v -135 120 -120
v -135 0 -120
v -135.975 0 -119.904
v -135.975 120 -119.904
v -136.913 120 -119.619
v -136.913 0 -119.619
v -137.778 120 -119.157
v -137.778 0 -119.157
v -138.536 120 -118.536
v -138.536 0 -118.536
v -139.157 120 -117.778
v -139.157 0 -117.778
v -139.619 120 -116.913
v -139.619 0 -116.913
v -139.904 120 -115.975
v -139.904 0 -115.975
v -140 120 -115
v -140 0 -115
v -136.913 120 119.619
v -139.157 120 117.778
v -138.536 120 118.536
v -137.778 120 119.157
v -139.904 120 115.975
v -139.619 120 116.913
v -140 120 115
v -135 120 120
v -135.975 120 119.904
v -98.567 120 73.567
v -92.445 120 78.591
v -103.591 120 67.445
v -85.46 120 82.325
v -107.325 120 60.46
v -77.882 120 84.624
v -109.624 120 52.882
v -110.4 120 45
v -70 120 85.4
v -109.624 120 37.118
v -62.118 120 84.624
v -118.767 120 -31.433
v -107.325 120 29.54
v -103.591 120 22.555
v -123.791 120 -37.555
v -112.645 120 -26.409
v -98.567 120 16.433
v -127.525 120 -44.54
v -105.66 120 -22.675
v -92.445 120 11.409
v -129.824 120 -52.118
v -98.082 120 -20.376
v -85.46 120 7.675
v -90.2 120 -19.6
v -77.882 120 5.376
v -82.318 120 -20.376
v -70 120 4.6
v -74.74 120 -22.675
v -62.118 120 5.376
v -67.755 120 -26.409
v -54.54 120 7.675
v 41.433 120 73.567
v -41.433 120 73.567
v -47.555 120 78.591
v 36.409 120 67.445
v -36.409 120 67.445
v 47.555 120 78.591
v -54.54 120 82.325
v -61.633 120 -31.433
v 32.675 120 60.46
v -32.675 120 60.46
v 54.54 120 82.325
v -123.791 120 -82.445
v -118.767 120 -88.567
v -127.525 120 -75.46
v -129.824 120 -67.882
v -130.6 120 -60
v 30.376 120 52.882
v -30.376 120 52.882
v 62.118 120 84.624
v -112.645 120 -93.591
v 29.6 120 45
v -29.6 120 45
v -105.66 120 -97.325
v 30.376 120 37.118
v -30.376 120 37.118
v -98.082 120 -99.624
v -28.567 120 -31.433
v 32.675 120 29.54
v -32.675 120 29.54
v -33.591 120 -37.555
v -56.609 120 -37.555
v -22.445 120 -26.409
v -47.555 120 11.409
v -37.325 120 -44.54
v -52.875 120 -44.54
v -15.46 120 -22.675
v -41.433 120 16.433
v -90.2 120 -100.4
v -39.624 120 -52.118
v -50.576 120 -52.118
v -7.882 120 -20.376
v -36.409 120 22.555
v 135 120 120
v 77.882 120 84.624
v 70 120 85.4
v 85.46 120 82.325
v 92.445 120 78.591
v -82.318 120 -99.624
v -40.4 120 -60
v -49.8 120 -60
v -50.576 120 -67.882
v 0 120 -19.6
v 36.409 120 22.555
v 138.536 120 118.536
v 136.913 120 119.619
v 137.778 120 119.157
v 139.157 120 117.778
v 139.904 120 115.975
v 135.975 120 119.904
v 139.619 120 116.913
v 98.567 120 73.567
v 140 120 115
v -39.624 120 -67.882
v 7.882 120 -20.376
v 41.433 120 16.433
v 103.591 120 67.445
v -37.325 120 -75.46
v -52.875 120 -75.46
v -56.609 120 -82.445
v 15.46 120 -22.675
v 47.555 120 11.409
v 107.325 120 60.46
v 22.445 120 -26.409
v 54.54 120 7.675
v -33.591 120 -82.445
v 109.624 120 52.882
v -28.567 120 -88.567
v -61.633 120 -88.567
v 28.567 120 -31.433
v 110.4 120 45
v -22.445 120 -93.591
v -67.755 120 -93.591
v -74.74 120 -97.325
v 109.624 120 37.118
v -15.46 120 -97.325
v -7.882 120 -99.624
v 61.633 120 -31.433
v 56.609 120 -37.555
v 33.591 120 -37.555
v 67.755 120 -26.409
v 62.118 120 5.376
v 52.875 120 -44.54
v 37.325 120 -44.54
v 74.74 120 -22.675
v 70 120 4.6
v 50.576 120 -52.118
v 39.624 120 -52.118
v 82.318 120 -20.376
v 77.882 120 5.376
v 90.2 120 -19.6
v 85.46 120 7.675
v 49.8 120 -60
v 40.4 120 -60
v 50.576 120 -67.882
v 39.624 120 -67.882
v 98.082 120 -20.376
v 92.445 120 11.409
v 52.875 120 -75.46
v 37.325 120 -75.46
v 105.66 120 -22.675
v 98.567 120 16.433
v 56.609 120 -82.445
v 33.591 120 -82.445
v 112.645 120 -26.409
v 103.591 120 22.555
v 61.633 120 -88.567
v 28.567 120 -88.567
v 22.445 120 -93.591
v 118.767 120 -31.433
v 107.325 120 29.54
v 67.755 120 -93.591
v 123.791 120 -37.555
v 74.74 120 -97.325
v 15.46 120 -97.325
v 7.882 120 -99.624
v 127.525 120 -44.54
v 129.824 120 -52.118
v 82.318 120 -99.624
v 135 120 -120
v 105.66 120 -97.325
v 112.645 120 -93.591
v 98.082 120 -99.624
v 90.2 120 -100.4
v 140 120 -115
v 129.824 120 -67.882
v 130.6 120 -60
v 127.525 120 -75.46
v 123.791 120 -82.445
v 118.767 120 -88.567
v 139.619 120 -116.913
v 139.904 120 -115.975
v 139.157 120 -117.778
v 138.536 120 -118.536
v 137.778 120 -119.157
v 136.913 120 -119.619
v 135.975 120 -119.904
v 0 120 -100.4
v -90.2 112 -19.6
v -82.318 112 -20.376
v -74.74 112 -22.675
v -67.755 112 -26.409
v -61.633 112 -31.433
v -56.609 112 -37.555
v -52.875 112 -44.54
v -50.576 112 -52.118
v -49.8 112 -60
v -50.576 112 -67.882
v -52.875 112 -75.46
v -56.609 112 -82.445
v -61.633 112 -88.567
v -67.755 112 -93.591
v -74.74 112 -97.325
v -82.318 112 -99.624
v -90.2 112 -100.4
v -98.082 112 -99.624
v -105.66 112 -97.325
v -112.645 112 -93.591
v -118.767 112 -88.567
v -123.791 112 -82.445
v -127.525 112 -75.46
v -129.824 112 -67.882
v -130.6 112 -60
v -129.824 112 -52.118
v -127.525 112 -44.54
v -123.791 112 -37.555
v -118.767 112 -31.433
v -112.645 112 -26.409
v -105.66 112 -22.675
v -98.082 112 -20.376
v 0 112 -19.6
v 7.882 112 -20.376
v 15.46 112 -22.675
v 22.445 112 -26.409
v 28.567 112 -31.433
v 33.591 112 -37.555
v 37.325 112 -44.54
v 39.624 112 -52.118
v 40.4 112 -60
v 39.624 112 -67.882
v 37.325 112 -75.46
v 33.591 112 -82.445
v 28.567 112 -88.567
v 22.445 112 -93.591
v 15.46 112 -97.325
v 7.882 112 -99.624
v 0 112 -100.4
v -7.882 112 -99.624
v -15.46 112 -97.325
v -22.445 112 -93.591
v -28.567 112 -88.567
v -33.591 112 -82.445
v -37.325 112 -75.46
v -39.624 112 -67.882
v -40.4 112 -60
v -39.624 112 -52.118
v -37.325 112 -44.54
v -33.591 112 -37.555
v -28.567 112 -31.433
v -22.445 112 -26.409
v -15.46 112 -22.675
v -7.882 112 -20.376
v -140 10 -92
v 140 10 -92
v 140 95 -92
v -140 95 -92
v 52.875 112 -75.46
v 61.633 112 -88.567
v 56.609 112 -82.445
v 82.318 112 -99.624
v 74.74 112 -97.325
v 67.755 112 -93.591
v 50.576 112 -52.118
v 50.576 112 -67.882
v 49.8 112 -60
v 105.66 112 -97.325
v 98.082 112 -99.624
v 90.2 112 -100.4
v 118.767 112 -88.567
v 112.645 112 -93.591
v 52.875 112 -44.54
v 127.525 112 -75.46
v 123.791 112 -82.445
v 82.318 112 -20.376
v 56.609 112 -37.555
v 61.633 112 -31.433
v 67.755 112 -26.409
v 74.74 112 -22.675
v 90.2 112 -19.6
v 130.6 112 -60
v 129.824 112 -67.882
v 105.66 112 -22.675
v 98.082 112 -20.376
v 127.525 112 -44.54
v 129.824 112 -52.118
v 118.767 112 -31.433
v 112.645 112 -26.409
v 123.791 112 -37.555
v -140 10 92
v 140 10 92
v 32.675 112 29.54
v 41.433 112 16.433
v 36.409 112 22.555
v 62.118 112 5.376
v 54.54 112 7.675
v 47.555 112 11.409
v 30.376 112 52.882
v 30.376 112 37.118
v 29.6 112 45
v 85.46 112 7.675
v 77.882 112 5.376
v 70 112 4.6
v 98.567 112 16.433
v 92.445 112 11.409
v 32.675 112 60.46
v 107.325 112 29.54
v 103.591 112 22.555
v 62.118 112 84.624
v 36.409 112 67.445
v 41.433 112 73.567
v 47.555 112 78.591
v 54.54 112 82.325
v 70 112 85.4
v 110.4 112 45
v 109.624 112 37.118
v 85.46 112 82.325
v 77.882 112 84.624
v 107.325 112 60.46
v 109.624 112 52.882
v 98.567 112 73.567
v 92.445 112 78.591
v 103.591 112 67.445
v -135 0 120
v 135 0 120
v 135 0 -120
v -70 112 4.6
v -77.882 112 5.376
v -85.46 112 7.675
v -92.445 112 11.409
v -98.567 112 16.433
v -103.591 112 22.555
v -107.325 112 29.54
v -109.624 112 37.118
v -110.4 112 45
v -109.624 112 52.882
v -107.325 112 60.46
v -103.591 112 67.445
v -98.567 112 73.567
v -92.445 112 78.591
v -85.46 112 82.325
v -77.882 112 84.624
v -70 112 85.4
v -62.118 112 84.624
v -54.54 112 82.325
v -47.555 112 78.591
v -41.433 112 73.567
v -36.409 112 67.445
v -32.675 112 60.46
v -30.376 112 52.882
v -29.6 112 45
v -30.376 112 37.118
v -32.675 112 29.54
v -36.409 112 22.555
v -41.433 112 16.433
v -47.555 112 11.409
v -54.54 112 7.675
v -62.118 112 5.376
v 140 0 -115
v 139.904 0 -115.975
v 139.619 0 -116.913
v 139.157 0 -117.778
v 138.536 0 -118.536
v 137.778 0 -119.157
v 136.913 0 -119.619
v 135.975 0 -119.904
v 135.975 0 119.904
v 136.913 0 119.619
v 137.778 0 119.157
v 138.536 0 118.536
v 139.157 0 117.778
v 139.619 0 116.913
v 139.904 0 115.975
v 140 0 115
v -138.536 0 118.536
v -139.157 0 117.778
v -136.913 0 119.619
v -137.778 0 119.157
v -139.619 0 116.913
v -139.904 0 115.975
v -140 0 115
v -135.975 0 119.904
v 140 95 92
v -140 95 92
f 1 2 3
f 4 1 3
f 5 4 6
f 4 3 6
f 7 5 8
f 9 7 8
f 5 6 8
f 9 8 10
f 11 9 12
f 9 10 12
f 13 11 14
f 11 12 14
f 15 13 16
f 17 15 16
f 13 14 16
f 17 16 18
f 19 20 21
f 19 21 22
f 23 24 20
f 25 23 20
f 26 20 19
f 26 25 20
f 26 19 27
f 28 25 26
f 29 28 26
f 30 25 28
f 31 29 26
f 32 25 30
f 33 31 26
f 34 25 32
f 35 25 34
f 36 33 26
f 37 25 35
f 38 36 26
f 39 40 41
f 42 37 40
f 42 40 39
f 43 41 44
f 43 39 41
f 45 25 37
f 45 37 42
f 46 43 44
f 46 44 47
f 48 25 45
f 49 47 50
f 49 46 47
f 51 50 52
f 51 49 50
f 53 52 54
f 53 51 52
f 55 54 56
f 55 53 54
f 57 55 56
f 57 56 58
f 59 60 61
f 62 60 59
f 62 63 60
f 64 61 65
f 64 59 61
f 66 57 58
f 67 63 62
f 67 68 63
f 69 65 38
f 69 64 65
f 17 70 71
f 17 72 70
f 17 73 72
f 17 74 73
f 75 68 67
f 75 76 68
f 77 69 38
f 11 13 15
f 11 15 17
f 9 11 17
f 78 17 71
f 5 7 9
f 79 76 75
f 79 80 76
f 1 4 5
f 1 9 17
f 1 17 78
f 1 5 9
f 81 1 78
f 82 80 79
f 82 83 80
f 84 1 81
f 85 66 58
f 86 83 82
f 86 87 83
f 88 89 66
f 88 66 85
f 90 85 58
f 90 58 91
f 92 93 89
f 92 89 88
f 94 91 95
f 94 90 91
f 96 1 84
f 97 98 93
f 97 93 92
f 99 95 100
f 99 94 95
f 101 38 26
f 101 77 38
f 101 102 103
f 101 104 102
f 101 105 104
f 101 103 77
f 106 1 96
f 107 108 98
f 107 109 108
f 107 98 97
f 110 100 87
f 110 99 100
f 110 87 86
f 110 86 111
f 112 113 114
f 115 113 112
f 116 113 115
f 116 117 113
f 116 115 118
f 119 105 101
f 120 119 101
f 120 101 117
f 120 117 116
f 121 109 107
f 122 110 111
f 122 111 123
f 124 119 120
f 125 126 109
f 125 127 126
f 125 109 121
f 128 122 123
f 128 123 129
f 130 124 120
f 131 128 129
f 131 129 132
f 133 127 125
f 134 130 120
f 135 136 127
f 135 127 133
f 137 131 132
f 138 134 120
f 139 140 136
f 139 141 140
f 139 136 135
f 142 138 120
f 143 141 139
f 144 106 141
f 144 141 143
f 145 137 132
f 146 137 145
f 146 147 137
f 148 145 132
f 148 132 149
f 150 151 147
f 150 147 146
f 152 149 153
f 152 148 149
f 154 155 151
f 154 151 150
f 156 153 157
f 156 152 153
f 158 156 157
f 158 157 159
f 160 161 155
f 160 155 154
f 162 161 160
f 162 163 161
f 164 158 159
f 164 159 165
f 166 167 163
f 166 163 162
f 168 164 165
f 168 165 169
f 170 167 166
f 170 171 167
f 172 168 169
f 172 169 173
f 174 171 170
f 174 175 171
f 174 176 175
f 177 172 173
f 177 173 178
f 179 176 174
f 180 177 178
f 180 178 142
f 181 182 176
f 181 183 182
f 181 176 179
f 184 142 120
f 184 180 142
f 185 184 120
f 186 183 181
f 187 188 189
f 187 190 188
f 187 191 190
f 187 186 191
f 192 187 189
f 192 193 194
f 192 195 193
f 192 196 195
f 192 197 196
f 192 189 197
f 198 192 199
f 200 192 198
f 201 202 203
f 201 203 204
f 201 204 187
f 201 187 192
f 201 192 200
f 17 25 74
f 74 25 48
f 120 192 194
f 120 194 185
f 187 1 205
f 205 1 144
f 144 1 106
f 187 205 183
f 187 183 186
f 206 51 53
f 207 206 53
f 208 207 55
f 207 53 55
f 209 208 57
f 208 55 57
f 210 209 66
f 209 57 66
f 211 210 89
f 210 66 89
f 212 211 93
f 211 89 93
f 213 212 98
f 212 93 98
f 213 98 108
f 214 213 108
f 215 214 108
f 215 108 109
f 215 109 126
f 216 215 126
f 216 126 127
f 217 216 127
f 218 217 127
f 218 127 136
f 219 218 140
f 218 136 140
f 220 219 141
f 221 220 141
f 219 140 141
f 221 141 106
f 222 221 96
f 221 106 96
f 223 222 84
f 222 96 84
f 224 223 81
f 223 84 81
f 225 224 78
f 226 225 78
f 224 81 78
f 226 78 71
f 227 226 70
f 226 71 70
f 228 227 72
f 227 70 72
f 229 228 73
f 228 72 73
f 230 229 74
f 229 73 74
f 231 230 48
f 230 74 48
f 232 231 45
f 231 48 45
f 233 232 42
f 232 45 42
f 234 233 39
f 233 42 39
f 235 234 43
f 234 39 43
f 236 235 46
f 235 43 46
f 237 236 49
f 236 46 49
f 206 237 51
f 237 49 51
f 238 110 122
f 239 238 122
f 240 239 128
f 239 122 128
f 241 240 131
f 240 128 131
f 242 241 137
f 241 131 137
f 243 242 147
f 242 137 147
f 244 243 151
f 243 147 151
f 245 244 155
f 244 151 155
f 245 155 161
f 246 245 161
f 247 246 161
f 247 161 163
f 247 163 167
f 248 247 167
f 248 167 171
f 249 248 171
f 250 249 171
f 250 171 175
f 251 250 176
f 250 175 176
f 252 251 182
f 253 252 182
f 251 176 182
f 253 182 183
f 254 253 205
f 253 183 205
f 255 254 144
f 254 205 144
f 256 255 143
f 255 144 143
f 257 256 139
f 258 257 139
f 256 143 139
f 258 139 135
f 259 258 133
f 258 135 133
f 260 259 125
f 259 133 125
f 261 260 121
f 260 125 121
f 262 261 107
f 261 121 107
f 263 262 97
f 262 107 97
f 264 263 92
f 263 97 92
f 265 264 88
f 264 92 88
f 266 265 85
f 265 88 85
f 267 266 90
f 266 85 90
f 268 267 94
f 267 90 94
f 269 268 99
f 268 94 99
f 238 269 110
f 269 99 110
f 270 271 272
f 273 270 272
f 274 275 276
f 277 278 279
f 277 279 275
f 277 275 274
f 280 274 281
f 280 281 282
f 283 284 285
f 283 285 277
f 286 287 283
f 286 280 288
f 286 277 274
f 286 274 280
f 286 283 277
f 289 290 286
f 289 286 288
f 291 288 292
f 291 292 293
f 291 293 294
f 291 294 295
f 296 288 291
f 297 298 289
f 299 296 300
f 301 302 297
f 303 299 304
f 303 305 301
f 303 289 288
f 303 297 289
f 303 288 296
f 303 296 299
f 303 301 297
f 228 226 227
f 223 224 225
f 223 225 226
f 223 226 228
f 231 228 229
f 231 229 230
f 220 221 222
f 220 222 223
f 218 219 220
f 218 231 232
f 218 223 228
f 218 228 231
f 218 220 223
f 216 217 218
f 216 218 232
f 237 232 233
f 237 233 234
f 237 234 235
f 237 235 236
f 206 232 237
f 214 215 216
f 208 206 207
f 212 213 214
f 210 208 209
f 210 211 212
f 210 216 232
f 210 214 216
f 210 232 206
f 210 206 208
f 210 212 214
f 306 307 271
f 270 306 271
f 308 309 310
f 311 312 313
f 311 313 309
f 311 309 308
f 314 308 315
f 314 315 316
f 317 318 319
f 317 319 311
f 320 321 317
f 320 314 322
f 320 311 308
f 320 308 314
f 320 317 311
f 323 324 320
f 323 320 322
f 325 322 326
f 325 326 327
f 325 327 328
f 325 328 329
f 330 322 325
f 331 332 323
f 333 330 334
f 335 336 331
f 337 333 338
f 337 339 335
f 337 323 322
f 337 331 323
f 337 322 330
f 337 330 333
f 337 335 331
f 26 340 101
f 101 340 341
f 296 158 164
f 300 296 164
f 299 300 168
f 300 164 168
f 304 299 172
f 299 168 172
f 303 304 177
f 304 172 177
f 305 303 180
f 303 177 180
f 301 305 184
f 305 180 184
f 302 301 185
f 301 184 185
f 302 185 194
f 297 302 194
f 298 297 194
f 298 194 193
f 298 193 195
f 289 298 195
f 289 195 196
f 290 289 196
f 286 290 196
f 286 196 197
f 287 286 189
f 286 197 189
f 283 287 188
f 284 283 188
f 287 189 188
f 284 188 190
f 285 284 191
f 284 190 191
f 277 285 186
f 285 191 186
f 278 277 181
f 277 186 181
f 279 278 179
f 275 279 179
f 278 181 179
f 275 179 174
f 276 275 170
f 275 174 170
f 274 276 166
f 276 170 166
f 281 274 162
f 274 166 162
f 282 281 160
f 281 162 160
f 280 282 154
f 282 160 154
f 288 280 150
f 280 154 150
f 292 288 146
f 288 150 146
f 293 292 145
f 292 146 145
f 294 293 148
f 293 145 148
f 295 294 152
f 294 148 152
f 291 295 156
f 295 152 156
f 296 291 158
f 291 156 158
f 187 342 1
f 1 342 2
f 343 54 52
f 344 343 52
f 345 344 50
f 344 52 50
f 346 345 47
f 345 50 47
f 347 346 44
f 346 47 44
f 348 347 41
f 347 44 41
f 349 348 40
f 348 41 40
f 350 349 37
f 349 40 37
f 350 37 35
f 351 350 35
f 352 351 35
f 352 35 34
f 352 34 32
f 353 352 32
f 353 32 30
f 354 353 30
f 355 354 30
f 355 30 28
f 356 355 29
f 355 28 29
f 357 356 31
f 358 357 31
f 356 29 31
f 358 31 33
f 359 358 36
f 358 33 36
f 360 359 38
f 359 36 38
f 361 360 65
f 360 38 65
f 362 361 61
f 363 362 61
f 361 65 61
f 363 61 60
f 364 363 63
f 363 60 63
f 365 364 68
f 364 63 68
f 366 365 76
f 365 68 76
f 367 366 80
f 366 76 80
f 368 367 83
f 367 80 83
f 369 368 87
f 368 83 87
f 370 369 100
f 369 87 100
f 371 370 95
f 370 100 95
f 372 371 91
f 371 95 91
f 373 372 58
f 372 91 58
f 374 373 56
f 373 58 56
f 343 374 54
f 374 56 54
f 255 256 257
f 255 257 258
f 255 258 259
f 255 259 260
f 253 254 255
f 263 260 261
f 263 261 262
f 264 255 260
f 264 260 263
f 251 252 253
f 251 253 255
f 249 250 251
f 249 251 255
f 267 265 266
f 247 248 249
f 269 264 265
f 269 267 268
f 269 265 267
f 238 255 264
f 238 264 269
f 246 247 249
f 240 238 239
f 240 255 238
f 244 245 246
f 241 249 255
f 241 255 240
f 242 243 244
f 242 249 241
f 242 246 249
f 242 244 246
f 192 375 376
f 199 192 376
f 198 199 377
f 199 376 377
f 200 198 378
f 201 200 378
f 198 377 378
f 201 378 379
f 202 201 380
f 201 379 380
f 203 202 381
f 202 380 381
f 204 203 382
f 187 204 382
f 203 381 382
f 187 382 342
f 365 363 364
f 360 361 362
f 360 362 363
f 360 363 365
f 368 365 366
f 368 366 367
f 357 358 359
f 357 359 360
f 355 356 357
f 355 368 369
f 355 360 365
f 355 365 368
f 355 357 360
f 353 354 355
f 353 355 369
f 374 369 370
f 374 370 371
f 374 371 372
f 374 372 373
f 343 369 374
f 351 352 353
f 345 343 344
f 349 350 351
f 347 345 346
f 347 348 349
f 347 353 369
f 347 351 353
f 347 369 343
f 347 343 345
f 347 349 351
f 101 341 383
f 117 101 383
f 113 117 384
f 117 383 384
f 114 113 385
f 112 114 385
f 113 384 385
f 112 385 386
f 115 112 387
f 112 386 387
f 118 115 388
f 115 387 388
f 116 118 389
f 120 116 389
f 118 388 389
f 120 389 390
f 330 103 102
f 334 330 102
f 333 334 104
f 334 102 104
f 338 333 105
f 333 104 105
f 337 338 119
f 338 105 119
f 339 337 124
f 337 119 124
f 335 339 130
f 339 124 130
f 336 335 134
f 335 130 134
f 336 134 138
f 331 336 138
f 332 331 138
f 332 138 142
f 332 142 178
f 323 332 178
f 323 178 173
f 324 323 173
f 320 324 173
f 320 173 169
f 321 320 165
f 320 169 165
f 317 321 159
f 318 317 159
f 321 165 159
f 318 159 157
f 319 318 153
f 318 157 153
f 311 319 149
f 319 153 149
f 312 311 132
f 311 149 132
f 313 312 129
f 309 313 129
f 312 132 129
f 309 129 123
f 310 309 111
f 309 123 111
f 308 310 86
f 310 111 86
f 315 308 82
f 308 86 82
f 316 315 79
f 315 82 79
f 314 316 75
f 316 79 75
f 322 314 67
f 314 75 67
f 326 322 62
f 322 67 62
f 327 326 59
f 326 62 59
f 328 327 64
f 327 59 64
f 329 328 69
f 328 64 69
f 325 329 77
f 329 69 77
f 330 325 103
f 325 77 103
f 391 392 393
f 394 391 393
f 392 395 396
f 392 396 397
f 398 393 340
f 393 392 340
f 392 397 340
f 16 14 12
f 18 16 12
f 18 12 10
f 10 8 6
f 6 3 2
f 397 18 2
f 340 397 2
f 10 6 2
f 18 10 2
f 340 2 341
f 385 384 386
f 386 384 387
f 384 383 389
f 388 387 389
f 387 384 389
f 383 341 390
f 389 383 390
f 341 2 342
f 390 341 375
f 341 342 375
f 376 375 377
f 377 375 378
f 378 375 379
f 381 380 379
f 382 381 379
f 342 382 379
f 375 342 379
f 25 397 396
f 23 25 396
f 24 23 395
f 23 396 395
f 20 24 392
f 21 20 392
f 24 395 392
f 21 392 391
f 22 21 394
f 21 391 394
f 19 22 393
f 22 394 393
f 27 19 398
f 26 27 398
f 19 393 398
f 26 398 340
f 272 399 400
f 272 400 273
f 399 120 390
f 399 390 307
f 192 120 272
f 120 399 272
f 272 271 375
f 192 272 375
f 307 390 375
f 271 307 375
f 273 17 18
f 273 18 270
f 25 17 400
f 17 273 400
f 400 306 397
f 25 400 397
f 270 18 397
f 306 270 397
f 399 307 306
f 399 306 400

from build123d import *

# Parameters (mm, degrees)
BOSS_EXTRUDE1_DEPTH = 120
SKETCH2_W           = 184
SKETCH2_H           = 85
CUT_EXTRUDE1_DEPTH  = 370
SKETCH3_R           = 40.4
CUT_EXTRUDE2_DEPTH  = 8


with BuildPart() as part:
    # Sketch1 → Boss-Extrude1 (new body)
    with BuildSketch(Plane(origin=(0, 0, 0), x_dir=(1, 0, 0), z_dir=(0, 1, 0))):
        with BuildLine():
            Line((0, 120), (-135, 120))
            ThreePointArc((-135, 120), (-138.535533906, 118.535533906), (-140, 115))
            Line((-140, 115), (-140, -115))
            ThreePointArc((-140, -115), (-138.535533906, -118.535533906), (-135, -120))
            Line((-135, -120), (135, -120))
            ThreePointArc((135, -120), (138.535533906, -118.535533906), (140, -115))
            Line((140, -115), (140, 115))
            ThreePointArc((140, 115), (138.535533906, 118.535533906), (135, 120))
            Line((135, 120), (0, 120))
        make_face()
    extrude(amount=BOSS_EXTRUDE1_DEPTH)

    # Sketch2 → Cut-Extrude1 (cut)
    with BuildSketch(Plane(origin=(140, 0, 0), x_dir=(0, 0, -1), z_dir=(1, 0, 0))):
        with Locations((0, 52.5)):
            Rectangle(SKETCH2_W, SKETCH2_H)
    extrude(amount=-CUT_EXTRUDE1_DEPTH, mode=Mode.SUBTRACT)

    # Sketch3 → Cut-Extrude2 (cut)
    with BuildSketch(Plane(origin=(0, 120, 0), x_dir=(1, 0, 0), z_dir=(0, 1, 0))):
        with Locations(Location((70, -45, 0), (0, 0, 270))):
            Circle(SKETCH3_R)
        with Locations(Location((-70, -45, 0), (0, 0, 90))):
            Circle(SKETCH3_R)
        with Locations(Location((0, 60, 0), (0, 0, 270))):
            Circle(SKETCH3_R)
        with Locations(Location((-90.2, 60, 0), (0, 0, 270))):
            Circle(SKETCH3_R)
        with Locations(Location((90.2, 60, 0), (0, 0, 270))):
            Circle(SKETCH3_R)
    extrude(amount=-CUT_EXTRUDE2_DEPTH, mode=Mode.SUBTRACT)


solid = part.part
